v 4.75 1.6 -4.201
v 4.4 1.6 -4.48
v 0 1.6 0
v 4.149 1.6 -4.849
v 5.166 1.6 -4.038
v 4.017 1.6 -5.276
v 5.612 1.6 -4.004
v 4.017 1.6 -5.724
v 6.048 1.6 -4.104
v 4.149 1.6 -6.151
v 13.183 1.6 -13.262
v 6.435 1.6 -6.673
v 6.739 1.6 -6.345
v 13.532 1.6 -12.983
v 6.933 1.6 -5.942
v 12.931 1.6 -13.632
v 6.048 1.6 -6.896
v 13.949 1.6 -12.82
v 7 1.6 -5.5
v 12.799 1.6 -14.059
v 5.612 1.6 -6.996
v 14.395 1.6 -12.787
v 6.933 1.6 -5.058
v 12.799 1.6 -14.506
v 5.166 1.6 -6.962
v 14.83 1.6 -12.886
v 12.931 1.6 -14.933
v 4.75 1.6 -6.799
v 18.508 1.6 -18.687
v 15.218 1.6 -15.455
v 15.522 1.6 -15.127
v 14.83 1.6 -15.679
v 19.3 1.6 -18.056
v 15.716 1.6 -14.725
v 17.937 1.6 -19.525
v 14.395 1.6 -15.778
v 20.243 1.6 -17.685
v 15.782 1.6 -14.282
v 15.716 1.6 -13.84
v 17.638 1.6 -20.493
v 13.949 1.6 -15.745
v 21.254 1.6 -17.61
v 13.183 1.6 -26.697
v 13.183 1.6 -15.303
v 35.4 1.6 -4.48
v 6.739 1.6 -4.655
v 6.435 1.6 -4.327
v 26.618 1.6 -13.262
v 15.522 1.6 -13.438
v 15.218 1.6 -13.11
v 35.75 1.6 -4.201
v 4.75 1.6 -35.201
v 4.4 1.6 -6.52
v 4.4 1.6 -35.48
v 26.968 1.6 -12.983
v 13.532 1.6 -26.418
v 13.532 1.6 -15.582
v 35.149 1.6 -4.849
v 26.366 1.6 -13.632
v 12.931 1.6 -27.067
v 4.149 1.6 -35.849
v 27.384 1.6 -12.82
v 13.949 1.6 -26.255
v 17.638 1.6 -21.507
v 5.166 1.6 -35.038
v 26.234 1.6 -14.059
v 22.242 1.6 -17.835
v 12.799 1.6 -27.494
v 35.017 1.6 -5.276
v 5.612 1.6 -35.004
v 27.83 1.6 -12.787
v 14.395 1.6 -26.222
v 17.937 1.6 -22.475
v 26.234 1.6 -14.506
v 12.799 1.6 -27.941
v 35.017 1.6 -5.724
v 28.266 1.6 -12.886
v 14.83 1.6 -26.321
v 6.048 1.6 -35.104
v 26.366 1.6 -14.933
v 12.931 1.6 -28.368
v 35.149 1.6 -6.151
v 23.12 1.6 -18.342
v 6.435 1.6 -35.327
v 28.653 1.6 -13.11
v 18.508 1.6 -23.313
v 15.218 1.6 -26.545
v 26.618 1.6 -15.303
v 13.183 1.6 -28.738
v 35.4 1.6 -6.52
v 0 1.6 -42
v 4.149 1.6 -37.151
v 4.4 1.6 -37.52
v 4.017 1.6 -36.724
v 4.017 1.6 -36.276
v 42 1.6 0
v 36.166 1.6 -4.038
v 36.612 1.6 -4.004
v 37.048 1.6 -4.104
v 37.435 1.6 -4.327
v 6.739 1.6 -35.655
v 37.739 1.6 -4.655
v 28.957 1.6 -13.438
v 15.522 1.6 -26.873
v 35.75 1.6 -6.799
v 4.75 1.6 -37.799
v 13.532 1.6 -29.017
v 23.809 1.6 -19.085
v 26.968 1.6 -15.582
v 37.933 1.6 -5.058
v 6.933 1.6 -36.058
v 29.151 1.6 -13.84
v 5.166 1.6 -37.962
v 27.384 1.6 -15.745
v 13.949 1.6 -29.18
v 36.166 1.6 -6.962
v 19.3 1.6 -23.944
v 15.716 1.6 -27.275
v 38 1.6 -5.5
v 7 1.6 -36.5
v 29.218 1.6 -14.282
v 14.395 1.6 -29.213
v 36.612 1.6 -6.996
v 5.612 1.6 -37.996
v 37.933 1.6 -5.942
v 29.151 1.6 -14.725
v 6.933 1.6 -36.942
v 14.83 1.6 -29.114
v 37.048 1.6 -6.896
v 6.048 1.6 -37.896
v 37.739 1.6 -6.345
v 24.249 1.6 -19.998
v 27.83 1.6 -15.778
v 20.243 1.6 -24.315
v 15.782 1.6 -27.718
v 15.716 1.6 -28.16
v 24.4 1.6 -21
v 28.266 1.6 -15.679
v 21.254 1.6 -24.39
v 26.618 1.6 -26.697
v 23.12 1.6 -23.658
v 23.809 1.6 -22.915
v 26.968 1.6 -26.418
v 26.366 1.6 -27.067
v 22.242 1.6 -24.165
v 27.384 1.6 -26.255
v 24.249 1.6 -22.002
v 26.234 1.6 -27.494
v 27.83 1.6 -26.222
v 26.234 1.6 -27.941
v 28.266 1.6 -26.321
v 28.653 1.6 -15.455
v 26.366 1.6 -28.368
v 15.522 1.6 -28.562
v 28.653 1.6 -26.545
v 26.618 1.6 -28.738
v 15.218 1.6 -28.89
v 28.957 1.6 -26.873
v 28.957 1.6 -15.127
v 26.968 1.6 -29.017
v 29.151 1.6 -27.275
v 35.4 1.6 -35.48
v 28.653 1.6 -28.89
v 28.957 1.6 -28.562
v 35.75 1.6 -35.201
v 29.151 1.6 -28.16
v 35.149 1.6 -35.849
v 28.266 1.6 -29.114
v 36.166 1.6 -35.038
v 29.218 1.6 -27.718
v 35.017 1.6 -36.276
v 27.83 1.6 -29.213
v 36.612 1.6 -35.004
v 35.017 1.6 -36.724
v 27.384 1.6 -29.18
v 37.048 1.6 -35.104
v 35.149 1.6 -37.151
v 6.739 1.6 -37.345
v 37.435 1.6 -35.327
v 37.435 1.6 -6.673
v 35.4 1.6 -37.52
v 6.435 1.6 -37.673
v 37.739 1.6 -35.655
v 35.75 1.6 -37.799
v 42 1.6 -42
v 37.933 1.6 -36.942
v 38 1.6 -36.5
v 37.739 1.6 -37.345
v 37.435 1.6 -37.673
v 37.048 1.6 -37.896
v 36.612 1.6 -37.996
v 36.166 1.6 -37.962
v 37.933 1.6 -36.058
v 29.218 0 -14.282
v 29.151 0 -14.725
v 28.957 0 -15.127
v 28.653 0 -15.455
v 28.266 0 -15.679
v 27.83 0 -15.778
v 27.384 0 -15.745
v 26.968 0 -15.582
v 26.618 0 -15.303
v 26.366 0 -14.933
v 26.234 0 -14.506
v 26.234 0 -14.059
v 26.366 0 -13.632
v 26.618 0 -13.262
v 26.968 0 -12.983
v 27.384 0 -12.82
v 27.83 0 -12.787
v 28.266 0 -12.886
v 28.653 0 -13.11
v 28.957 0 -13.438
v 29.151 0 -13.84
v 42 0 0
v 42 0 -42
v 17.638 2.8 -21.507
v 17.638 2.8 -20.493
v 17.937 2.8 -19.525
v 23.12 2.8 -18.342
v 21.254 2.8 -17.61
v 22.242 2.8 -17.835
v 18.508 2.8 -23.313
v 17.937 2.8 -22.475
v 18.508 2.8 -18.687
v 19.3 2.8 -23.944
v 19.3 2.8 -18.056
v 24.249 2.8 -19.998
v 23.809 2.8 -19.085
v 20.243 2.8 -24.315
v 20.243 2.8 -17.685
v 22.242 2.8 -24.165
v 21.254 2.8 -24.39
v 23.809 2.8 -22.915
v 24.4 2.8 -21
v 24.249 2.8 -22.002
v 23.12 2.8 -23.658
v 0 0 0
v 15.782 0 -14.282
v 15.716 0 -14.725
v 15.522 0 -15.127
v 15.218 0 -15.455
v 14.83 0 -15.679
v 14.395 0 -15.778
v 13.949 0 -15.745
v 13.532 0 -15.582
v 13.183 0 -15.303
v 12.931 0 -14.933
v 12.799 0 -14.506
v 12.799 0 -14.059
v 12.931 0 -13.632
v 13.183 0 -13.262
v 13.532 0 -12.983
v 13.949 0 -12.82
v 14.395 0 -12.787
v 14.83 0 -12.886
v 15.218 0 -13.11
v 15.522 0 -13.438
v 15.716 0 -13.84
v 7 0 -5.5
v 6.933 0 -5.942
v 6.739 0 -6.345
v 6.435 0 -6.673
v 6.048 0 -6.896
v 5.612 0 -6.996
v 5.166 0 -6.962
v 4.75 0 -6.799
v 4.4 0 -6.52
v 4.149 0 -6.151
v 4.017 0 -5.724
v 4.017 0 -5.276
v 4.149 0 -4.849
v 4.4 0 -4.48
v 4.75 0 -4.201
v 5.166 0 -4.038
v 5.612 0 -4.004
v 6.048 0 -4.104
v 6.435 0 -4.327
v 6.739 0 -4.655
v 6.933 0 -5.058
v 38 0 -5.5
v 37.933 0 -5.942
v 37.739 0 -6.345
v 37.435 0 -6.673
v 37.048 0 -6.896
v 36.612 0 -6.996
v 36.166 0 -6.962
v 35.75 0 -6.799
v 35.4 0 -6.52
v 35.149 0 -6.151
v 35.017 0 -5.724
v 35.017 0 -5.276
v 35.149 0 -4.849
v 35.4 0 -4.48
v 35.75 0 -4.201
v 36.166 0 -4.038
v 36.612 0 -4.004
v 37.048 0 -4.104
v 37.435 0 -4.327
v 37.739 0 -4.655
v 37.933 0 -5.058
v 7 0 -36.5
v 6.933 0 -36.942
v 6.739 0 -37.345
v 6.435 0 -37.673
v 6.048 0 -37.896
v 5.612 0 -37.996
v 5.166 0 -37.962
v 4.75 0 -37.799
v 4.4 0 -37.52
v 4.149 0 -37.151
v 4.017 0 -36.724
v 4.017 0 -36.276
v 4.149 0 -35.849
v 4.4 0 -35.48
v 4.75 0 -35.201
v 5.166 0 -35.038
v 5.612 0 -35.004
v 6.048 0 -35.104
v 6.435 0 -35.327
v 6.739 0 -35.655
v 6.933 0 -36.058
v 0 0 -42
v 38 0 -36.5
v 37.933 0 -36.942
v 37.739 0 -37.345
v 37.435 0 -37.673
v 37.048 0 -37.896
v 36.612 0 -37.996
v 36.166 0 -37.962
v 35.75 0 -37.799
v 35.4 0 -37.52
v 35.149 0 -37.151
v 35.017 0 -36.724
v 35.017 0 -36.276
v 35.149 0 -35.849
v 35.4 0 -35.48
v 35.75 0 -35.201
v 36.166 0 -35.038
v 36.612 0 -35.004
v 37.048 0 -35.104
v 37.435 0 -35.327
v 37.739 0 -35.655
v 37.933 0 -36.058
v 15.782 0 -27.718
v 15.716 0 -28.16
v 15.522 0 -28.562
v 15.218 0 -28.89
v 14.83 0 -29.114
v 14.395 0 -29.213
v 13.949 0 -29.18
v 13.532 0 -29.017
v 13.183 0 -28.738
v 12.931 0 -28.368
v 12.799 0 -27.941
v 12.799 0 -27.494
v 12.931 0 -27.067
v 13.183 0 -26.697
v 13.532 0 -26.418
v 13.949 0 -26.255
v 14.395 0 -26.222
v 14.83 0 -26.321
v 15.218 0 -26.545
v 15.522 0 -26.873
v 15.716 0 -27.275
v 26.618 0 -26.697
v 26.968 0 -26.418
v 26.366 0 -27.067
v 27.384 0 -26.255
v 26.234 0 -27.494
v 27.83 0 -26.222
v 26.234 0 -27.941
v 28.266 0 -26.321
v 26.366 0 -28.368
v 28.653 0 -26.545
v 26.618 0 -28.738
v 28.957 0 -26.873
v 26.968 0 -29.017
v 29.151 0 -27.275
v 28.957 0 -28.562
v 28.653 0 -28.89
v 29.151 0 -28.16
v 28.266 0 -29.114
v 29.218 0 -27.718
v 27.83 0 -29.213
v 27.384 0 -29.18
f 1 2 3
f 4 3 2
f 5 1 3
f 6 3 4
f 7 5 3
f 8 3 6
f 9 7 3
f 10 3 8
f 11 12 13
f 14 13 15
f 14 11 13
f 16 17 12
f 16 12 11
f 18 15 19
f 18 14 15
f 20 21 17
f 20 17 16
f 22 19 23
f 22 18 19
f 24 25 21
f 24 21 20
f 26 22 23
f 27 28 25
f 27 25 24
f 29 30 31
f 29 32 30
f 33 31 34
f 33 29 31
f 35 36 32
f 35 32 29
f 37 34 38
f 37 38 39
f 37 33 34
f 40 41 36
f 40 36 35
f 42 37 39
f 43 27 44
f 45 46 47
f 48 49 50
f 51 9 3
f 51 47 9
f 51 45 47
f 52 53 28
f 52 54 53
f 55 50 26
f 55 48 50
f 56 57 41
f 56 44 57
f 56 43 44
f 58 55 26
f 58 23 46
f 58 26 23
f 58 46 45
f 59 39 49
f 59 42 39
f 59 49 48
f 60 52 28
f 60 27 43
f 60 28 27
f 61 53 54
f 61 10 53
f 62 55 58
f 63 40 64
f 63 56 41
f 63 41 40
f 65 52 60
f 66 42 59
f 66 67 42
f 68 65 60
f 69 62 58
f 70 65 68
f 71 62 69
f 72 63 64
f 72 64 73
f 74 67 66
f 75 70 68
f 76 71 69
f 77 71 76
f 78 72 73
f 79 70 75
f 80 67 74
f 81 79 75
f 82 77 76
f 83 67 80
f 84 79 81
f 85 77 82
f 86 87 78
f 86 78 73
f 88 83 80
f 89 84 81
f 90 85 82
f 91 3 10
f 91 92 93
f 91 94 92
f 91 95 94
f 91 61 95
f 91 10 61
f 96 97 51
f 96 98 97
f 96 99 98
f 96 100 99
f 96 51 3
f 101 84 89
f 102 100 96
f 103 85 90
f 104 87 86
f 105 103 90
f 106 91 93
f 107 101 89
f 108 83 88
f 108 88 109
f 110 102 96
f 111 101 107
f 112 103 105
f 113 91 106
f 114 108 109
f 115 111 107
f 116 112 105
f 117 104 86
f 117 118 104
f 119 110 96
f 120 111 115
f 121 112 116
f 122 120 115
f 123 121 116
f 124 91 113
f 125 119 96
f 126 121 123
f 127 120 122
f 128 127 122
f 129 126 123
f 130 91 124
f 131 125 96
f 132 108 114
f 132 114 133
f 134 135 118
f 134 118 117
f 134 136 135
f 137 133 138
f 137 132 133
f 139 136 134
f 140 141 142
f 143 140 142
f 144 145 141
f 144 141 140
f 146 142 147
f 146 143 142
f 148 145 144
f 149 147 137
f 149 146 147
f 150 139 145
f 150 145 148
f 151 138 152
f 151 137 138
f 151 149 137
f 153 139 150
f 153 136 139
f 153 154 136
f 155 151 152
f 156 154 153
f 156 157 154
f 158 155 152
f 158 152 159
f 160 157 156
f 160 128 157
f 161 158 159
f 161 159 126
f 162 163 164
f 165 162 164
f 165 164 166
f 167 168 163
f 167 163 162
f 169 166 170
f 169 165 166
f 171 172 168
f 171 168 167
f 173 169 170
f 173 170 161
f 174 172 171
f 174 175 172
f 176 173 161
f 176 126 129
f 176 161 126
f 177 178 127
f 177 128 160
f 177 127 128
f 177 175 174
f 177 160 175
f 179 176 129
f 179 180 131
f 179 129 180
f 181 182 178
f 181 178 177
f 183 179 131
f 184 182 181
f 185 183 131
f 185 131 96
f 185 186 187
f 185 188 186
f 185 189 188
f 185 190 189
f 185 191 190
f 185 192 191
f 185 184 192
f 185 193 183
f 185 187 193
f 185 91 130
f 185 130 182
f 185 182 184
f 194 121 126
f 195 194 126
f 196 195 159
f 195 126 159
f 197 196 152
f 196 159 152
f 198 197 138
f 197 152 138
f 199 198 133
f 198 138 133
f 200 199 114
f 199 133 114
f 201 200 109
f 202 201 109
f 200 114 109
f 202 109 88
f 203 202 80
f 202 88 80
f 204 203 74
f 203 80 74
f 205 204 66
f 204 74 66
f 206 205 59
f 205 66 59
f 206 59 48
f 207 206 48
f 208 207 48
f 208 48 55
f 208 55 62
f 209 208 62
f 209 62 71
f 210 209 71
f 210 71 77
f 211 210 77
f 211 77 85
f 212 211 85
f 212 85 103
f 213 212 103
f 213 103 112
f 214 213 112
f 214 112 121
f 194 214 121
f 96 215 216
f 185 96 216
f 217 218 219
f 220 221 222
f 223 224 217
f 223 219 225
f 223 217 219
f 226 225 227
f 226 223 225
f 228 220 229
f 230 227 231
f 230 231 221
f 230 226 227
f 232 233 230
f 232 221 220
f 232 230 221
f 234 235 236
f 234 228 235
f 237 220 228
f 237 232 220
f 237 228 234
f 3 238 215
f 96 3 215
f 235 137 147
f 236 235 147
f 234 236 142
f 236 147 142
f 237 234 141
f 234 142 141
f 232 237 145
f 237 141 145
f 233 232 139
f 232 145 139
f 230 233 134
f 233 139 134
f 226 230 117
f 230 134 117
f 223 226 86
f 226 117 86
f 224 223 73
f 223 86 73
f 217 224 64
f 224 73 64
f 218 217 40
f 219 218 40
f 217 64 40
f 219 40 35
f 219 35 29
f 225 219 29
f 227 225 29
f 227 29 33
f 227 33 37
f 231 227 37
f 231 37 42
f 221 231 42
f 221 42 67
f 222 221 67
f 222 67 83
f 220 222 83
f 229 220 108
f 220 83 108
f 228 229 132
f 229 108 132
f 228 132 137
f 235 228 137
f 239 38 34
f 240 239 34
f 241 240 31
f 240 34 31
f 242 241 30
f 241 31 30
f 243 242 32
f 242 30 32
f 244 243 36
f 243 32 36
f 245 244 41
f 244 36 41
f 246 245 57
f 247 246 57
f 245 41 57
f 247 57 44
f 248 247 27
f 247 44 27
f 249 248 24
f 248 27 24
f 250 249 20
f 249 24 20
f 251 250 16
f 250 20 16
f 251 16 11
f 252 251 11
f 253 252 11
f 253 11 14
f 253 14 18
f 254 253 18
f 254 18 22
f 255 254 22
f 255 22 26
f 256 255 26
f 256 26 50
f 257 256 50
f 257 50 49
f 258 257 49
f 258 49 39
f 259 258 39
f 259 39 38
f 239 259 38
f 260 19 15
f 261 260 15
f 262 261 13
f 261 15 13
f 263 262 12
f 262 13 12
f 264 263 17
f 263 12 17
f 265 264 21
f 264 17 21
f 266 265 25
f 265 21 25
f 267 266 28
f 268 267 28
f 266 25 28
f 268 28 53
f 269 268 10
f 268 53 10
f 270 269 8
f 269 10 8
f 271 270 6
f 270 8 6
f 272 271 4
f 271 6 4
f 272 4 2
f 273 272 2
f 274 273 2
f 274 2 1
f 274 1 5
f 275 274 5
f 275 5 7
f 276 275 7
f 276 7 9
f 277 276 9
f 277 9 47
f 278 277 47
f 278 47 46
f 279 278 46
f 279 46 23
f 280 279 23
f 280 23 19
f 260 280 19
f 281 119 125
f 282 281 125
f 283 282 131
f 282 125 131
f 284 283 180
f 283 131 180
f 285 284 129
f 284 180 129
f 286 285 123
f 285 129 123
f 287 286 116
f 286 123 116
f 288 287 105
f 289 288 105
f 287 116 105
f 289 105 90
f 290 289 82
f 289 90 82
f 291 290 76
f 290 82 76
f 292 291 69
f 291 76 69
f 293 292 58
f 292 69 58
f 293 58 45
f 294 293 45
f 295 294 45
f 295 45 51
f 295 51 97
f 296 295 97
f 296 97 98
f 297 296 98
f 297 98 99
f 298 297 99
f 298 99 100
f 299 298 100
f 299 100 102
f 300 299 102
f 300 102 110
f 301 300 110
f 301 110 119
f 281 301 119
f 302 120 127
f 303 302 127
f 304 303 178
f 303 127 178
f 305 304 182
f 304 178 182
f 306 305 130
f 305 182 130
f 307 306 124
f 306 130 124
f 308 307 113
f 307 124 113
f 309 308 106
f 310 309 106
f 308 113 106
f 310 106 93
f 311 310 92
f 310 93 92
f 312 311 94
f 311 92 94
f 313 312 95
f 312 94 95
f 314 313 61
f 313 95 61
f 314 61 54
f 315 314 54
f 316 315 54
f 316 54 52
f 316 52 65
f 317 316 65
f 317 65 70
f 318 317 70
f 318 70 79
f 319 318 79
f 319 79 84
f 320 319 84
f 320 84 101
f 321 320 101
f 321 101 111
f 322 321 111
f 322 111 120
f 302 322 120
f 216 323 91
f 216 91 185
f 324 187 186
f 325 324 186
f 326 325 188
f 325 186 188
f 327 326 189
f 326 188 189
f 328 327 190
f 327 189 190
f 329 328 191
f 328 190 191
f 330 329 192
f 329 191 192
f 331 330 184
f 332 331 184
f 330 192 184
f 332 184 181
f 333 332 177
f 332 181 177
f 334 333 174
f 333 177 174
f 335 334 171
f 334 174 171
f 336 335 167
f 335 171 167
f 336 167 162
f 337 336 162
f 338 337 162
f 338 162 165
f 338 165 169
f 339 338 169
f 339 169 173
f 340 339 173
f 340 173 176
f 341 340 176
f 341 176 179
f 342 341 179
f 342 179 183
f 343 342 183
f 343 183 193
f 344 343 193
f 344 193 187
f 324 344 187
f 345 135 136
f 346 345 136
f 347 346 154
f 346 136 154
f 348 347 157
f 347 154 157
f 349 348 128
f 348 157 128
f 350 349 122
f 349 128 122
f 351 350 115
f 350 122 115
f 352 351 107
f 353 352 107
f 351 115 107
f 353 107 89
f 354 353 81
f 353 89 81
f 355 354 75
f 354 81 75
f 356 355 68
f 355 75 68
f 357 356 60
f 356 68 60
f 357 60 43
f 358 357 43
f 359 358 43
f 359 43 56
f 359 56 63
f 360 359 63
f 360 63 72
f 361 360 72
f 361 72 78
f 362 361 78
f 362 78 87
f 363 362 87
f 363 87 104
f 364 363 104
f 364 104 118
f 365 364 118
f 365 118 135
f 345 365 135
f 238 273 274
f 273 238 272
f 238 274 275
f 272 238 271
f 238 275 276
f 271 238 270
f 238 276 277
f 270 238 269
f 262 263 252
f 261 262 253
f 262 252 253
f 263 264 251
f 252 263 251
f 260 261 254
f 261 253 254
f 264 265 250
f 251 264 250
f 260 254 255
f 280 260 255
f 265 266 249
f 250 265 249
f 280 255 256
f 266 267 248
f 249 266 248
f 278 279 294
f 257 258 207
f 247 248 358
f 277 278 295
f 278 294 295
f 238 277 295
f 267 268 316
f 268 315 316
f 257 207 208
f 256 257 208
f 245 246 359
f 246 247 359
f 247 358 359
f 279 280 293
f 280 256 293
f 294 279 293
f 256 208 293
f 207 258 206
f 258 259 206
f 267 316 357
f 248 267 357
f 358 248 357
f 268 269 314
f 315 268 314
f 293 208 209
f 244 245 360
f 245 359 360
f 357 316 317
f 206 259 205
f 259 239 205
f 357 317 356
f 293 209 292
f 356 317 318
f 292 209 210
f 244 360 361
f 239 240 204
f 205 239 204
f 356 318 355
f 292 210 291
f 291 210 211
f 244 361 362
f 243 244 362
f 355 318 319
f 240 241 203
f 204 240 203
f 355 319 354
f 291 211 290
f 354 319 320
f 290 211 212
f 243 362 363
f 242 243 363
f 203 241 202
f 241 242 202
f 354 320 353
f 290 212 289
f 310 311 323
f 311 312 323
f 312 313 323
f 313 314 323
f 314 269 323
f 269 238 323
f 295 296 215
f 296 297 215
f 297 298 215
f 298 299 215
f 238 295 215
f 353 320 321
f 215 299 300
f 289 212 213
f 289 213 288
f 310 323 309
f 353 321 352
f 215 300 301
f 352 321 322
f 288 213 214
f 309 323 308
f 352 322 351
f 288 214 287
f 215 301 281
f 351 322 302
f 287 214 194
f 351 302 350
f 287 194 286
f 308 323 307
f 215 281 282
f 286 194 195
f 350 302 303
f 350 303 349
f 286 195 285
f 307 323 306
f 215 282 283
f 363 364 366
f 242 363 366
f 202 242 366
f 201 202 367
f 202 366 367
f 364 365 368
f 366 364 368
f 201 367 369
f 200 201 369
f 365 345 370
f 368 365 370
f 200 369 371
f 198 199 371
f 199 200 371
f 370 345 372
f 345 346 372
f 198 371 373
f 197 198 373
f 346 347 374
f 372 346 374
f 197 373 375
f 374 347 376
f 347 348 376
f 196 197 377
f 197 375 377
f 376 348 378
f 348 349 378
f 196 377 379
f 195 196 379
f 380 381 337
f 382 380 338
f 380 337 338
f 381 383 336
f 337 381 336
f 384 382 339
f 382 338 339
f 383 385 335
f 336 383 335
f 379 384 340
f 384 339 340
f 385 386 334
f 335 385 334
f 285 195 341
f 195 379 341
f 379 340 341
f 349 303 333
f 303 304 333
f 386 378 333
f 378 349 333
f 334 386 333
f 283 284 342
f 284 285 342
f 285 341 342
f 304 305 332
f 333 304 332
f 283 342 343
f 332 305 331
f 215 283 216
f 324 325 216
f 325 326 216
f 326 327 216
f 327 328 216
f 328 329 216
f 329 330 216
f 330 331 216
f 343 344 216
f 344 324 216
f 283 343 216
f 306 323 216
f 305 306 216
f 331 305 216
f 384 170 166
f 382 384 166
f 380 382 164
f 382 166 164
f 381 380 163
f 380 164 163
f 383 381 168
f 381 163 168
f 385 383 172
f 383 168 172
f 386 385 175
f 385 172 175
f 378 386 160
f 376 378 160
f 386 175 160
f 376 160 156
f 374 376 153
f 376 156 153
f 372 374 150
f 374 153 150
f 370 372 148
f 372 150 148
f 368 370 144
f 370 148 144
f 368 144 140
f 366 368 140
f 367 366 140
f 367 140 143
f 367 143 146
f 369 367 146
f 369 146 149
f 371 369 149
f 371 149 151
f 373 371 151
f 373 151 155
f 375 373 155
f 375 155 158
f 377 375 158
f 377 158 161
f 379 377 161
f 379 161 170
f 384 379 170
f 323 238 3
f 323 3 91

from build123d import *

# Parameters (mm, degrees)
SKETCH_1_W          = 42
SKETCH_1_H          = 42
EXTRUDE_1_DEPTH     = 1.6
SKETCH_2_R          = 1.5
CUT_EXTRUDE_1_DEPTH = 2.6
SKETCH_3_R          = 3.4
EXTRUDE_2_DEPTH     = 1.2
SKETCH_4_R          = 1.5
CUT_EXTRUDE_2_DEPTH = 10


with BuildPart() as part:
    # 草图1 → 凸台-拉伸1 (new body)
    with BuildSketch(Plane(origin=(0, 0, 0), x_dir=(1, 0, 0), z_dir=(0, 1, 0))):
        with Locations((21, 21)):
            Rectangle(SKETCH_1_W, SKETCH_1_H)
    extrude(amount=EXTRUDE_1_DEPTH)

    # 草图2 → 切除-拉伸1 (cut, through all)
    with BuildSketch(Plane(origin=(0, 1.6, 0), x_dir=(1, 0, 0), z_dir=(0, 1, 0))):
        with Locations((5.5, 36.5)):
            Circle(SKETCH_2_R)
        with Locations((36.5, 36.5)):
            Circle(SKETCH_2_R)
        with Locations((5.5, 5.5)):
            Circle(SKETCH_2_R)
        with Locations((36.5, 5.5)):
            Circle(SKETCH_2_R)
    extrude(amount=-CUT_EXTRUDE_1_DEPTH, mode=Mode.SUBTRACT)

    # 草图3 → 凸台-拉伸2 (add)
    with BuildSketch(Plane(origin=(0, 1.6, 0), x_dir=(1, 0, 0), z_dir=(0, 1, 0))):
        with Locations((21, 21)):
            Circle(SKETCH_3_R)
    extrude(amount=EXTRUDE_2_DEPTH)

    # 草图4 → 切除-拉伸2 (cut)
    with BuildSketch(Plane(origin=(0, 1.6, 0), x_dir=(1, 0, 0), z_dir=(0, 1, 0))):
        with Locations((14.282485579, 27.717514421)):
            Circle(SKETCH_4_R)
        with Locations((27.717514421, 27.717514421)):
            Circle(SKETCH_4_R)
        with Locations((14.282485579, 14.282485579)):
            Circle(SKETCH_4_R)
        with Locations((27.717514421, 14.282485579)):
            Circle(SKETCH_4_R)
    extrude(amount=-CUT_EXTRUDE_2_DEPTH, mode=Mode.SUBTRACT)


solid = part.part
